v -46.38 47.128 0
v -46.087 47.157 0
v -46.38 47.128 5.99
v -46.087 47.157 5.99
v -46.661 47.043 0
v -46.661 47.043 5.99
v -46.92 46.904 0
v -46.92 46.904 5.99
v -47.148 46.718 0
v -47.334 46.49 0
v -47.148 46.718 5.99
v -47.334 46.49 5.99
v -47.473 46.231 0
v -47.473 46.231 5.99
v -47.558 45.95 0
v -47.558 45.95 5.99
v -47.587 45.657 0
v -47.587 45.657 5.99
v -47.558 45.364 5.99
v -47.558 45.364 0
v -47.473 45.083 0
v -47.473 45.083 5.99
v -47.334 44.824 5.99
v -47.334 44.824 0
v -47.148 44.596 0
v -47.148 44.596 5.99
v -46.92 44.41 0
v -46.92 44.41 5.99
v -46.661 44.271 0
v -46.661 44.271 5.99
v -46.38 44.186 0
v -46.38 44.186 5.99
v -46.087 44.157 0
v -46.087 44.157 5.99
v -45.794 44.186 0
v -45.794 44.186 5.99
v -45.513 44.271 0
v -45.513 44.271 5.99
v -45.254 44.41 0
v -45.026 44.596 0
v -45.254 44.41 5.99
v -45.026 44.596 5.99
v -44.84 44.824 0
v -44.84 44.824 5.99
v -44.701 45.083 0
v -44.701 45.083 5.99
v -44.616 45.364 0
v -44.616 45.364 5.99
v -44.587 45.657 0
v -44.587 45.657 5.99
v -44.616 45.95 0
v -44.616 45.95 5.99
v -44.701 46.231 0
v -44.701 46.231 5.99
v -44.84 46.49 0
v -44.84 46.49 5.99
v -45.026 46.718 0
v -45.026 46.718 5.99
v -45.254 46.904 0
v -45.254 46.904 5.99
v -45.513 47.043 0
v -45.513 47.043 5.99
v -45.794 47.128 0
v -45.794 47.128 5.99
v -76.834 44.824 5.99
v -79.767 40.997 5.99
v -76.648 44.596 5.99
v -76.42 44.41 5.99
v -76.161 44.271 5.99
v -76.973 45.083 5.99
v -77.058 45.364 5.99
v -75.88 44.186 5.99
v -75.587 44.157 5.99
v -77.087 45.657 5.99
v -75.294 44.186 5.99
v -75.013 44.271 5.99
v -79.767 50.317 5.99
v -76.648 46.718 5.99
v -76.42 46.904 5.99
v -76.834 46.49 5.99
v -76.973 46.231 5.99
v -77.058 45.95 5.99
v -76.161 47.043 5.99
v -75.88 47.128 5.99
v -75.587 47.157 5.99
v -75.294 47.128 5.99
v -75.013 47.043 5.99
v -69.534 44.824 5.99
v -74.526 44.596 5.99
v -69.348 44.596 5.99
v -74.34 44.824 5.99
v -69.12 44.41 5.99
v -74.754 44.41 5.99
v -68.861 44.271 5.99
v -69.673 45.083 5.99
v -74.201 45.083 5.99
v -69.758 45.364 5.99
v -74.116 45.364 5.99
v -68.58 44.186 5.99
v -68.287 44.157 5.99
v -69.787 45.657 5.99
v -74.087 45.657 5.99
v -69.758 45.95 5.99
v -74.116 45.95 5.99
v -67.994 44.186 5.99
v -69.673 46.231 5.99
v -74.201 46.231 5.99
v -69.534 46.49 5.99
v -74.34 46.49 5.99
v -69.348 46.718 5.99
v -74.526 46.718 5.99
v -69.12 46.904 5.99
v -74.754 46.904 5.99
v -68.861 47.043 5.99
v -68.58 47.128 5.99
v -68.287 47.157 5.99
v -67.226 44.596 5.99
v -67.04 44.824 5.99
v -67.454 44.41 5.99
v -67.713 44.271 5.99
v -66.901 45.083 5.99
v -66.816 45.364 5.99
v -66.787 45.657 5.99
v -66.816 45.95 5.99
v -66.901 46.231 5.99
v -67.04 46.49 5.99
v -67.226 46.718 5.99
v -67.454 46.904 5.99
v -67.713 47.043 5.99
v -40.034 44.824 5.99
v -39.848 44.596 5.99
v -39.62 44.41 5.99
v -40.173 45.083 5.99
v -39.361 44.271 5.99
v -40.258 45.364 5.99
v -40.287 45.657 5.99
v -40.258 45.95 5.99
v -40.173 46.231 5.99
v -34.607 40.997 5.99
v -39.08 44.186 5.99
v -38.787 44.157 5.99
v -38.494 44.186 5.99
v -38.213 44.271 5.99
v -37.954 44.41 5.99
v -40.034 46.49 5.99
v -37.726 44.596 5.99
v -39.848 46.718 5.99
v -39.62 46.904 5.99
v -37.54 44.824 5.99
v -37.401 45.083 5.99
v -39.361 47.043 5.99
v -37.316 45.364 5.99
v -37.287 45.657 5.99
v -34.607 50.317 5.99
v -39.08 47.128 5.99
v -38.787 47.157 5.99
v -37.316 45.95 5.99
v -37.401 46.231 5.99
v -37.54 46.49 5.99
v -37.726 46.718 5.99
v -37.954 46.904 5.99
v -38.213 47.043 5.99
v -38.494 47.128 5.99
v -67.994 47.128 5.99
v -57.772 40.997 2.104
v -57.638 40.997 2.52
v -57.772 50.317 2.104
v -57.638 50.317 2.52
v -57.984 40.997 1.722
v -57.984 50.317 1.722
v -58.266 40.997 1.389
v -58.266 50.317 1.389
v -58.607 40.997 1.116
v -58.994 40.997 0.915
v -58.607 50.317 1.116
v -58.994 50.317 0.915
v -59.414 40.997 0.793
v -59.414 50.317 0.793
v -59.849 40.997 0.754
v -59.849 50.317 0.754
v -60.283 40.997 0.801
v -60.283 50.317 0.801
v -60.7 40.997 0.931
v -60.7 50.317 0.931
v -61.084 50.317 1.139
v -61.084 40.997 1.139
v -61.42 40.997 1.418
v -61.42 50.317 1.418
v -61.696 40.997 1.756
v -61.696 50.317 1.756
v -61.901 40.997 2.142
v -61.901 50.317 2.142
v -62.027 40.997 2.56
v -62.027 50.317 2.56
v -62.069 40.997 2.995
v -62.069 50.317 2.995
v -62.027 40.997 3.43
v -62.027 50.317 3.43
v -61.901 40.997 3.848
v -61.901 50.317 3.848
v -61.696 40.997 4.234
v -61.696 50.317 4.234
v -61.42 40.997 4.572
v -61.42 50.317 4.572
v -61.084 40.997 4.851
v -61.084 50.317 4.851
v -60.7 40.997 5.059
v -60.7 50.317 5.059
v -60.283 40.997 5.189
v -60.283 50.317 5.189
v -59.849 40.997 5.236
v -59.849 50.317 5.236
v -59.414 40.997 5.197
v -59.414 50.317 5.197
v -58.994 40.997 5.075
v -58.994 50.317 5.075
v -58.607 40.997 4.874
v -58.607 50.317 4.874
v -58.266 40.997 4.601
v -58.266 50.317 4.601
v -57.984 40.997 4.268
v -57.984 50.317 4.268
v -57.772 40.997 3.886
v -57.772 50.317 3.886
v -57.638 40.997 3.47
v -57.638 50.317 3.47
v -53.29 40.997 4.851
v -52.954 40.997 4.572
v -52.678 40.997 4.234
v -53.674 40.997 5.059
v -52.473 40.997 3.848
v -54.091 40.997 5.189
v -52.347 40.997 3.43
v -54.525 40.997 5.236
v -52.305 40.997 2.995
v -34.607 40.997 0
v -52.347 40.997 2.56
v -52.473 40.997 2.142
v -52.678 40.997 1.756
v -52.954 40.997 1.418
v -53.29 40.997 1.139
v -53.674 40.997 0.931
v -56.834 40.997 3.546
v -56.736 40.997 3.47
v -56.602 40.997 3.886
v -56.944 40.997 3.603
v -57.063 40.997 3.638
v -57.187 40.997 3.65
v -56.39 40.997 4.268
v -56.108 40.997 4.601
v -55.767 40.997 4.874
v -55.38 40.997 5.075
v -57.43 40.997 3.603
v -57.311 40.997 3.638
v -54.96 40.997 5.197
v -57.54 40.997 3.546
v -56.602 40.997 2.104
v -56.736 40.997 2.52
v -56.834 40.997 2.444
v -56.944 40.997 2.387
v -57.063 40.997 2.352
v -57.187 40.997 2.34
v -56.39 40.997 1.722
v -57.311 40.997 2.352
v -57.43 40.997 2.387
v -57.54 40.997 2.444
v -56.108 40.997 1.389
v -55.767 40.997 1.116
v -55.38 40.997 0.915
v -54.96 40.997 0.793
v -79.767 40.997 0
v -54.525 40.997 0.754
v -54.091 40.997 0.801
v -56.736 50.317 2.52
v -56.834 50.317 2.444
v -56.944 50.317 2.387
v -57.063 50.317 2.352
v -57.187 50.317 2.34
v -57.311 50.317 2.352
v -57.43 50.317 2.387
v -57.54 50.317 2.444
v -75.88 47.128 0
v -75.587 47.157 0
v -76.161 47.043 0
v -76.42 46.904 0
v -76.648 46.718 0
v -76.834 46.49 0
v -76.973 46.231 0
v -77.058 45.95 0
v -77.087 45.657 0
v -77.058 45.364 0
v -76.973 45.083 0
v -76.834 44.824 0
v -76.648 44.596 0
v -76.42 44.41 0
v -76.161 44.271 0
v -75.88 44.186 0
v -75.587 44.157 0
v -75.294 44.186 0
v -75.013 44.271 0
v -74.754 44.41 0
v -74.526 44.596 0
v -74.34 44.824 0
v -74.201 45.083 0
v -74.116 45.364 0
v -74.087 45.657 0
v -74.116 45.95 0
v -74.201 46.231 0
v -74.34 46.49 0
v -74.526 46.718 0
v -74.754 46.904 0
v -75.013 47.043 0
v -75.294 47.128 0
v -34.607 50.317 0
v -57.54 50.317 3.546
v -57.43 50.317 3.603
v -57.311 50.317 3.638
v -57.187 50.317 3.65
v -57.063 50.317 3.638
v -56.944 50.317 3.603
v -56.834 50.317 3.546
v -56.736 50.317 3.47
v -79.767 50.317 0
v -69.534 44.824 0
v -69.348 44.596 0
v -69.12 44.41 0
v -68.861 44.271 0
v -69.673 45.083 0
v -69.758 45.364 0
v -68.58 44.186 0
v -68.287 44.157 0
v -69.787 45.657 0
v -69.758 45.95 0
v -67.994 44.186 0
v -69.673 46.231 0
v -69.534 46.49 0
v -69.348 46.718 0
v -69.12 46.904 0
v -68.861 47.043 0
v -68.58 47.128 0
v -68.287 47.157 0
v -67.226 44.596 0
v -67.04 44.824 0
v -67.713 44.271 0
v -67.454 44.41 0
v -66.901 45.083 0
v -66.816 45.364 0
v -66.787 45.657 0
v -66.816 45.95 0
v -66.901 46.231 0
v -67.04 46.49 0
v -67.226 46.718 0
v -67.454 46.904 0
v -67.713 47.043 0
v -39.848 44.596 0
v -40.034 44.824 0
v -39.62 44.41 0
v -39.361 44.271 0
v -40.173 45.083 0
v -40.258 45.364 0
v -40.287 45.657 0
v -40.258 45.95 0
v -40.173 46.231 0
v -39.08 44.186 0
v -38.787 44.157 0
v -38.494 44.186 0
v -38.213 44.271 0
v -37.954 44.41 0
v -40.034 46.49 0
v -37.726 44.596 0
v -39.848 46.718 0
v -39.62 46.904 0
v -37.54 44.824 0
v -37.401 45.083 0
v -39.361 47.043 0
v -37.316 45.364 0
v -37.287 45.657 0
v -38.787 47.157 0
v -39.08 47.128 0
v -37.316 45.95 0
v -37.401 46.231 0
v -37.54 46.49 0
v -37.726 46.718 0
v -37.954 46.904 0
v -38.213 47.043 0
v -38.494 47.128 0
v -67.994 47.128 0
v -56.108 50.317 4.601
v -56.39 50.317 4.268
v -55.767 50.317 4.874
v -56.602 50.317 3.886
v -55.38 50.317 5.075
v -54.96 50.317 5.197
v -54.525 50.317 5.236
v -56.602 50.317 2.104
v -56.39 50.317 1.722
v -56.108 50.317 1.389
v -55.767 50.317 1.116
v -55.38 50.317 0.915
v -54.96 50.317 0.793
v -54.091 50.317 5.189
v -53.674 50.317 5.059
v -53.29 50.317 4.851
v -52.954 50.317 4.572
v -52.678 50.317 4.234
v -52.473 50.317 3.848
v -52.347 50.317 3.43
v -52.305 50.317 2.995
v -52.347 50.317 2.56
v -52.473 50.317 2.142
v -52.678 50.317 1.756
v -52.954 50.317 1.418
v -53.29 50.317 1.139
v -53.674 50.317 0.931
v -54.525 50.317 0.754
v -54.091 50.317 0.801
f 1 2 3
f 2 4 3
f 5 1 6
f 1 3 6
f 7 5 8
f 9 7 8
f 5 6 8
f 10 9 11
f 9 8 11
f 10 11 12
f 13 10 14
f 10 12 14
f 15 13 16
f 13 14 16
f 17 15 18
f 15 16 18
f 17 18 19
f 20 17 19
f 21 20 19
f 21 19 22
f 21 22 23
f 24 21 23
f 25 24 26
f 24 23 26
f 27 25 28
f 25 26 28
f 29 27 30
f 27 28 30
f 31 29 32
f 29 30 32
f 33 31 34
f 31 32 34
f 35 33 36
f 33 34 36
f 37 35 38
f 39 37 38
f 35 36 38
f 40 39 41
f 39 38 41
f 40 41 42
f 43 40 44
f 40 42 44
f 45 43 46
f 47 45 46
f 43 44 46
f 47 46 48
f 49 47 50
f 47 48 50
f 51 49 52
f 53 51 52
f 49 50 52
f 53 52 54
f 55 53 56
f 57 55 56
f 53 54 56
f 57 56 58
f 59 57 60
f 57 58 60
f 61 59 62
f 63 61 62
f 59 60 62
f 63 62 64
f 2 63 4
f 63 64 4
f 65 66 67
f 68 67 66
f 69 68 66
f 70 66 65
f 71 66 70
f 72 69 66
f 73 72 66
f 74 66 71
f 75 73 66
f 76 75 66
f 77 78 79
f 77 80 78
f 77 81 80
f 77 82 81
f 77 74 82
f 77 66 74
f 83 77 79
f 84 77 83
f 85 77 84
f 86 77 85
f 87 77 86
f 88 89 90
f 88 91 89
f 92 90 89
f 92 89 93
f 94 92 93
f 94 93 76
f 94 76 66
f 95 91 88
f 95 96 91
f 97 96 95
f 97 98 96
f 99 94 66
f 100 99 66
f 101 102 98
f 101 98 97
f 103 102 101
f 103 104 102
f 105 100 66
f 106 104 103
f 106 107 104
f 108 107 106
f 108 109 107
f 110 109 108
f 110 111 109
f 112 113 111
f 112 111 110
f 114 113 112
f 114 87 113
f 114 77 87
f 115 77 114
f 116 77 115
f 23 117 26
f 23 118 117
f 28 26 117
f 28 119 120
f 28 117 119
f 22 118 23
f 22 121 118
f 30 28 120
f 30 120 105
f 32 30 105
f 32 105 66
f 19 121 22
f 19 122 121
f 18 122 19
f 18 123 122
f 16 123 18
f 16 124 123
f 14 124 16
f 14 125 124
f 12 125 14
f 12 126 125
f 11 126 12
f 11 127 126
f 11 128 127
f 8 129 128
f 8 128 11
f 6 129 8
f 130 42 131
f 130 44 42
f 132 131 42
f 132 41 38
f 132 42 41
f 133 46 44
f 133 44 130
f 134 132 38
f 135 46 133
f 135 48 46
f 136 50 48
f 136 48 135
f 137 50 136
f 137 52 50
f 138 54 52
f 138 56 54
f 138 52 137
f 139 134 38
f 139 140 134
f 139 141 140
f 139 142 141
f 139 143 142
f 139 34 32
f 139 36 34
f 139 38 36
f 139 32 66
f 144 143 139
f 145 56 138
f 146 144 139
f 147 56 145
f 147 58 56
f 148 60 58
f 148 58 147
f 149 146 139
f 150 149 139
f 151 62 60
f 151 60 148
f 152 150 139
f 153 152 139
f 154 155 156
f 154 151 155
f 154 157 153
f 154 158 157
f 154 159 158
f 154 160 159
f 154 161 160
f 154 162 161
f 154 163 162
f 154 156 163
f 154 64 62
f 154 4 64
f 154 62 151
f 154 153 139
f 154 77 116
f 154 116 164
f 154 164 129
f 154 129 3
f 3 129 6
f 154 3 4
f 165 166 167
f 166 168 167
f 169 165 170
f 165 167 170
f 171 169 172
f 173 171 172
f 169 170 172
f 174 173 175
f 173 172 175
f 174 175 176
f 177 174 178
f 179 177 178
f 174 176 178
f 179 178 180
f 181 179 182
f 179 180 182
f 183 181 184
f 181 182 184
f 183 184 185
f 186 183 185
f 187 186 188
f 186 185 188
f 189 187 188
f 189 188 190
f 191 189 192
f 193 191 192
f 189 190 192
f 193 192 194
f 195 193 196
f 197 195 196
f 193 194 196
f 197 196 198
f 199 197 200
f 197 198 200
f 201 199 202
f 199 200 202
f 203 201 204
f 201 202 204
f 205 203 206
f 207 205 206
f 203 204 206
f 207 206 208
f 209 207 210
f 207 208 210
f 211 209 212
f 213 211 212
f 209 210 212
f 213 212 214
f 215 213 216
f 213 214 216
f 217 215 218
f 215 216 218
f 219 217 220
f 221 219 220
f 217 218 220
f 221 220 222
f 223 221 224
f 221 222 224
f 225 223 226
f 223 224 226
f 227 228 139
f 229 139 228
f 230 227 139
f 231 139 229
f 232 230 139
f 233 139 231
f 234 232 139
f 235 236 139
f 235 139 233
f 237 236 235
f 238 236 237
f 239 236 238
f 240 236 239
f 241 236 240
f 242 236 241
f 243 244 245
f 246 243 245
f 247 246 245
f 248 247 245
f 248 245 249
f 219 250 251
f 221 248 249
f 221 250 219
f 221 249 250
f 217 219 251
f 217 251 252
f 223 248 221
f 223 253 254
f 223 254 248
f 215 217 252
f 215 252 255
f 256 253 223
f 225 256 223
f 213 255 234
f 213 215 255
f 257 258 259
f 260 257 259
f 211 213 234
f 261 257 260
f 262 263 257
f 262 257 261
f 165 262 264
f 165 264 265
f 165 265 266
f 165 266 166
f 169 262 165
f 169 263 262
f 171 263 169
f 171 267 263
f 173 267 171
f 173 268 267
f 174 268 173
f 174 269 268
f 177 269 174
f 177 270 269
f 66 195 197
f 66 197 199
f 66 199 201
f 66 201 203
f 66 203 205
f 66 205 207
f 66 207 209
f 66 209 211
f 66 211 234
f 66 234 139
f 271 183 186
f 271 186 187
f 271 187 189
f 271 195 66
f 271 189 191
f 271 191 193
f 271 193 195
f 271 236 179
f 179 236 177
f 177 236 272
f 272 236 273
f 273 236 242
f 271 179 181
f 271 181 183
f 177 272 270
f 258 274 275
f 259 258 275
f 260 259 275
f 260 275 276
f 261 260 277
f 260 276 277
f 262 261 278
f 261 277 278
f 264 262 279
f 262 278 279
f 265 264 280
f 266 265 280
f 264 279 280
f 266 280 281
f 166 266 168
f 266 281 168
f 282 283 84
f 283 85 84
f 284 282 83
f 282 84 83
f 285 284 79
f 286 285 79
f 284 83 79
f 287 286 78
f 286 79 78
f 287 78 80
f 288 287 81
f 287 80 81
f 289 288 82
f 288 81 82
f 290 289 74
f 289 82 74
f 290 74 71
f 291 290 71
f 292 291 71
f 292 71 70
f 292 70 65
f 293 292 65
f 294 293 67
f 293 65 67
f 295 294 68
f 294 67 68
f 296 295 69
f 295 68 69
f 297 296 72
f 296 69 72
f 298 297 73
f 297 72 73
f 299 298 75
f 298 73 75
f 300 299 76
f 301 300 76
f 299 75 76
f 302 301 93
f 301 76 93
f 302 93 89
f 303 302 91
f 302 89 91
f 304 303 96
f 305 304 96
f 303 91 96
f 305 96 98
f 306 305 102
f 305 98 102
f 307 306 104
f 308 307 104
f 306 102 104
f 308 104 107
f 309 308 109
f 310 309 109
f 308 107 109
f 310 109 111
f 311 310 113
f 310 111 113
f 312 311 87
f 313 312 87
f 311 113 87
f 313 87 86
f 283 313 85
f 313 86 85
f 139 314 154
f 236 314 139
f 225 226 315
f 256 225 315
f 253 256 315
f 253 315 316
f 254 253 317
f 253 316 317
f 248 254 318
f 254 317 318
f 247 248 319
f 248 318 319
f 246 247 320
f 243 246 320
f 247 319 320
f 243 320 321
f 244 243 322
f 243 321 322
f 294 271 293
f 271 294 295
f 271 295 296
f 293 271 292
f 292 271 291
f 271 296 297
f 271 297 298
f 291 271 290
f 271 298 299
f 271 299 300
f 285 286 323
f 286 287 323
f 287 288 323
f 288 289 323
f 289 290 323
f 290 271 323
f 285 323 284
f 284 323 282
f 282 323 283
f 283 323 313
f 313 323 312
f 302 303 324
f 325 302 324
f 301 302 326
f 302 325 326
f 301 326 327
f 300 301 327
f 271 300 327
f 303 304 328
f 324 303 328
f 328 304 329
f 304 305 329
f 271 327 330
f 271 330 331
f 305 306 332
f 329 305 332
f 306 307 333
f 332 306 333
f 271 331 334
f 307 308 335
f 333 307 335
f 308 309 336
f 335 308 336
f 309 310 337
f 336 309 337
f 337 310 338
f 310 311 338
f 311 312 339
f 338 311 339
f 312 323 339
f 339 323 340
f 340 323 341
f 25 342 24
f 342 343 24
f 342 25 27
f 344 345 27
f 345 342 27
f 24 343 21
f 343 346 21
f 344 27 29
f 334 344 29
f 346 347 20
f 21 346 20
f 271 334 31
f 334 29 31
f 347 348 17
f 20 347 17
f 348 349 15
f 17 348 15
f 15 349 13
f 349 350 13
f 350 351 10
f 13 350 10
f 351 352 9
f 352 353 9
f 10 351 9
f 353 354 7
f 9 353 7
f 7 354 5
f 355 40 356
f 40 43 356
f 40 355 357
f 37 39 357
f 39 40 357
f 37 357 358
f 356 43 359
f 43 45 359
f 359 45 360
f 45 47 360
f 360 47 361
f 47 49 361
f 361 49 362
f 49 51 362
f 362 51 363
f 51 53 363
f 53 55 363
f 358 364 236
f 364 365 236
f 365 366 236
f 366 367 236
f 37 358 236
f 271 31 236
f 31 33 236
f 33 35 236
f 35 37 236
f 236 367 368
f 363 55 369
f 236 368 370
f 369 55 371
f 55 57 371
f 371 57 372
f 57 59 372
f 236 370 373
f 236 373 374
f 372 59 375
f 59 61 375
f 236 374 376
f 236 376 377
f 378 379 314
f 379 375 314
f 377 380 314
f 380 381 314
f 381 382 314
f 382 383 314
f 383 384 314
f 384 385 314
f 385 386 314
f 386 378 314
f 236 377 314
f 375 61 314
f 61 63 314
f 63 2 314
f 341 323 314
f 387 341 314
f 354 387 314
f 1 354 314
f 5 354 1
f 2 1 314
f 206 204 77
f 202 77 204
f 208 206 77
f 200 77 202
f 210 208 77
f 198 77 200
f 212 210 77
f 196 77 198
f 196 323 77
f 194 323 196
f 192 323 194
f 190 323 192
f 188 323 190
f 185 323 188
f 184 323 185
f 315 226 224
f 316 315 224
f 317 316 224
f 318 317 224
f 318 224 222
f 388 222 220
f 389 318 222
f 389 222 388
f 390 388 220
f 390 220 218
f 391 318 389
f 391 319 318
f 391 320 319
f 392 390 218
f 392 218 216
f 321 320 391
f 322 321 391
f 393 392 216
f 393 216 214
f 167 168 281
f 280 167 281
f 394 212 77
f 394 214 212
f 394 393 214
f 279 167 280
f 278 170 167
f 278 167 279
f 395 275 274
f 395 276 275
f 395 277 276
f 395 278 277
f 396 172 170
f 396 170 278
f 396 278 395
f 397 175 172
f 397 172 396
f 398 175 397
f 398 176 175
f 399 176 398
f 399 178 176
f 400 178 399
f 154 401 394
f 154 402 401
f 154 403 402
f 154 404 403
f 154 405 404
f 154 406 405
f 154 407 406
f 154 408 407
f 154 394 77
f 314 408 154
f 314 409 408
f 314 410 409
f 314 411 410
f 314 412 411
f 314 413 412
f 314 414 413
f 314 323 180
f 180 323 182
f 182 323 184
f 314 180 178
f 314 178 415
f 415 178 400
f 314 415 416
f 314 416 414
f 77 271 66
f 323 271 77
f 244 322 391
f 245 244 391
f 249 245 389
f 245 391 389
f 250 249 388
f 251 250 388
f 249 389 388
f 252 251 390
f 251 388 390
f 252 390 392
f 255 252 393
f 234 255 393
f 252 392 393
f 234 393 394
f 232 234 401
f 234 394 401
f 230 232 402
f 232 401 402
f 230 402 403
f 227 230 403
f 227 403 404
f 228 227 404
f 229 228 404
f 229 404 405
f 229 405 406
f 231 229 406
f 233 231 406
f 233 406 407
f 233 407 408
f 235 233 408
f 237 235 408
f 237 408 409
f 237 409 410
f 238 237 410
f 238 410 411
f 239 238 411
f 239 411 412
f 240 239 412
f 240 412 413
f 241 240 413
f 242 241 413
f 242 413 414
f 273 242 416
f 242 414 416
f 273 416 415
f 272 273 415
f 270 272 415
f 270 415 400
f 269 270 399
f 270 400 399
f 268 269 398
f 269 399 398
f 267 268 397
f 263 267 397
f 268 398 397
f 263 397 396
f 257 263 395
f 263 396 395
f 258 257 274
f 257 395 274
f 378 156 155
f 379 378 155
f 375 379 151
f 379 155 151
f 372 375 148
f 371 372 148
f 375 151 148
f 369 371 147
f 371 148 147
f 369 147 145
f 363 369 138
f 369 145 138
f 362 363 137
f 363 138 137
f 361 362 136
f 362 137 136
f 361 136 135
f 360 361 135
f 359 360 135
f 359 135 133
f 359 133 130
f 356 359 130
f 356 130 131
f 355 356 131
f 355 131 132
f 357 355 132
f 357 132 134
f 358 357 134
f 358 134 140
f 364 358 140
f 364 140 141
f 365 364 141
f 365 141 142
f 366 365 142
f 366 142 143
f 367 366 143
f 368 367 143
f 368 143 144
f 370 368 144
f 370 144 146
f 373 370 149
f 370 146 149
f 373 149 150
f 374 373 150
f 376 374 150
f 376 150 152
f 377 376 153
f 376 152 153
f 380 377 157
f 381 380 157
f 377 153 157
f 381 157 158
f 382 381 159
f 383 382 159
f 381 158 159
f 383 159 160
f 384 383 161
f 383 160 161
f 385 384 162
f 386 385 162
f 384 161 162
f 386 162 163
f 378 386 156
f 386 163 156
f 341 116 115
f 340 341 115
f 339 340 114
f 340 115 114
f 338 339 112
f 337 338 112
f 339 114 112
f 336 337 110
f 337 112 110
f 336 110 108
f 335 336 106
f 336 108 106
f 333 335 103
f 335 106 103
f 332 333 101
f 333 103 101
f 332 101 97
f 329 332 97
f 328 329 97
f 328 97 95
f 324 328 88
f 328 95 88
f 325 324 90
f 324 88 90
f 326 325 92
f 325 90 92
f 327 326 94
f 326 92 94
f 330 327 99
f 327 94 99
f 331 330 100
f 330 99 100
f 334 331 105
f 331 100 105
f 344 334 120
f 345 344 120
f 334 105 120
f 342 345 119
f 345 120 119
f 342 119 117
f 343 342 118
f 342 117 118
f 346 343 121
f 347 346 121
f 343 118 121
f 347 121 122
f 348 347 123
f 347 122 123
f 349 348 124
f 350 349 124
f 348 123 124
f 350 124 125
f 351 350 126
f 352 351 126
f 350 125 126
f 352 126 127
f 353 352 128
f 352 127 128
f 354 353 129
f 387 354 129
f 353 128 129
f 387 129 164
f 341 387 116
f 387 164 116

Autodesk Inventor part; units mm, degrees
ref_plane "YZ Plane" through (0, 0, 0) normal (1, 0, 0) x (0, 1, 0)
ref_plane "XZ Plane" through (0, 0, 0) normal (0, 1, 0) x (-1, 0, 0)
ref_plane "XY Plane" through (0, 0, 0) normal (0, 0, 1) x (1, 0, 0)
sketch "Sketch1" plane through (0, 0, 0) normal (0, 0, 1) x (1, 0, 0)
  line L0 (-79.767, 50.3169) -> (-34.607, 50.3169)
  line L1 (-34.607, 50.3169) -> (-34.607, 40.9969)
  line L2 (-34.607, 40.9969) -> (-79.767, 40.9969)
  line L3 (-79.767, 40.9969) -> (-79.767, 50.3169)
  line L4 (-57.187, 40.9969) -> (-57.187, 50.3169)
  point P0 (0, 0)
  point P1 (-75.587, 45.6569)
  point P2 (-79.767, 45.6569)
  point P3 (-68.287, 45.6569)
  point P4 (-38.787, 45.6569)
  point P5 (-46.087, 45.6569)
  dimension "d0" = 45.16
  dimension "d1" = 9.32
  dimension "d2" = 4.18
  dimension "d3" = 7.3
extrude "Extrusion1" add sketch "Sketch1" along normal blind 5.99
hole "Hole1" at (-38.787, 45.6569, 0) at (-46.087, 45.6569, 0) at (-68.287, 45.6569, 0) at (-75.587, 45.6569, 0) direction (0, 0, 1) diameter 3 end through all
thread "Thread1" size "M3x0.5" class "6H" standard "ANSI Metric M Profile" full length
thread "Thread2" size "M3x0.5" class "6H" standard "ANSI Metric M Profile" full length
thread "Thread3" size "M3x0.5" class "6H" standard "ANSI Metric M Profile" full length
thread "Thread4" size "M3x0.5" class "6H" standard "ANSI Metric M Profile" full length
sketch "Sketch2" plane through (-79.767, 50.3169, 0) normal (0, 1, 0) x (1, 0, 0)
  line L0 (0, 0) -> (45.16, 0)
  line L1 (45.16, -5.99) -> (0, -5.99)
  arc A0 (23.0312, -3.4698) -> (23.0312, -2.5202) centre (25.2213, -2.995) ccw
  arc A1 (22.1288, -2.5202) -> (22.1288, -3.4698) centre (19.9387, -2.995) ccw
  arc A2 (22.1288, -3.4698) -> (23.0312, -3.4698) centre (22.58, -2.995) ccw
  arc A3 (23.0312, -2.5202) -> (22.1288, -2.5202) centre (22.58, -2.995) ccw
  point P0 (79.767, 0)
extrude "Extrusion2" cut sketch "Sketch2" against normal through all
properties part number "load_cell"
